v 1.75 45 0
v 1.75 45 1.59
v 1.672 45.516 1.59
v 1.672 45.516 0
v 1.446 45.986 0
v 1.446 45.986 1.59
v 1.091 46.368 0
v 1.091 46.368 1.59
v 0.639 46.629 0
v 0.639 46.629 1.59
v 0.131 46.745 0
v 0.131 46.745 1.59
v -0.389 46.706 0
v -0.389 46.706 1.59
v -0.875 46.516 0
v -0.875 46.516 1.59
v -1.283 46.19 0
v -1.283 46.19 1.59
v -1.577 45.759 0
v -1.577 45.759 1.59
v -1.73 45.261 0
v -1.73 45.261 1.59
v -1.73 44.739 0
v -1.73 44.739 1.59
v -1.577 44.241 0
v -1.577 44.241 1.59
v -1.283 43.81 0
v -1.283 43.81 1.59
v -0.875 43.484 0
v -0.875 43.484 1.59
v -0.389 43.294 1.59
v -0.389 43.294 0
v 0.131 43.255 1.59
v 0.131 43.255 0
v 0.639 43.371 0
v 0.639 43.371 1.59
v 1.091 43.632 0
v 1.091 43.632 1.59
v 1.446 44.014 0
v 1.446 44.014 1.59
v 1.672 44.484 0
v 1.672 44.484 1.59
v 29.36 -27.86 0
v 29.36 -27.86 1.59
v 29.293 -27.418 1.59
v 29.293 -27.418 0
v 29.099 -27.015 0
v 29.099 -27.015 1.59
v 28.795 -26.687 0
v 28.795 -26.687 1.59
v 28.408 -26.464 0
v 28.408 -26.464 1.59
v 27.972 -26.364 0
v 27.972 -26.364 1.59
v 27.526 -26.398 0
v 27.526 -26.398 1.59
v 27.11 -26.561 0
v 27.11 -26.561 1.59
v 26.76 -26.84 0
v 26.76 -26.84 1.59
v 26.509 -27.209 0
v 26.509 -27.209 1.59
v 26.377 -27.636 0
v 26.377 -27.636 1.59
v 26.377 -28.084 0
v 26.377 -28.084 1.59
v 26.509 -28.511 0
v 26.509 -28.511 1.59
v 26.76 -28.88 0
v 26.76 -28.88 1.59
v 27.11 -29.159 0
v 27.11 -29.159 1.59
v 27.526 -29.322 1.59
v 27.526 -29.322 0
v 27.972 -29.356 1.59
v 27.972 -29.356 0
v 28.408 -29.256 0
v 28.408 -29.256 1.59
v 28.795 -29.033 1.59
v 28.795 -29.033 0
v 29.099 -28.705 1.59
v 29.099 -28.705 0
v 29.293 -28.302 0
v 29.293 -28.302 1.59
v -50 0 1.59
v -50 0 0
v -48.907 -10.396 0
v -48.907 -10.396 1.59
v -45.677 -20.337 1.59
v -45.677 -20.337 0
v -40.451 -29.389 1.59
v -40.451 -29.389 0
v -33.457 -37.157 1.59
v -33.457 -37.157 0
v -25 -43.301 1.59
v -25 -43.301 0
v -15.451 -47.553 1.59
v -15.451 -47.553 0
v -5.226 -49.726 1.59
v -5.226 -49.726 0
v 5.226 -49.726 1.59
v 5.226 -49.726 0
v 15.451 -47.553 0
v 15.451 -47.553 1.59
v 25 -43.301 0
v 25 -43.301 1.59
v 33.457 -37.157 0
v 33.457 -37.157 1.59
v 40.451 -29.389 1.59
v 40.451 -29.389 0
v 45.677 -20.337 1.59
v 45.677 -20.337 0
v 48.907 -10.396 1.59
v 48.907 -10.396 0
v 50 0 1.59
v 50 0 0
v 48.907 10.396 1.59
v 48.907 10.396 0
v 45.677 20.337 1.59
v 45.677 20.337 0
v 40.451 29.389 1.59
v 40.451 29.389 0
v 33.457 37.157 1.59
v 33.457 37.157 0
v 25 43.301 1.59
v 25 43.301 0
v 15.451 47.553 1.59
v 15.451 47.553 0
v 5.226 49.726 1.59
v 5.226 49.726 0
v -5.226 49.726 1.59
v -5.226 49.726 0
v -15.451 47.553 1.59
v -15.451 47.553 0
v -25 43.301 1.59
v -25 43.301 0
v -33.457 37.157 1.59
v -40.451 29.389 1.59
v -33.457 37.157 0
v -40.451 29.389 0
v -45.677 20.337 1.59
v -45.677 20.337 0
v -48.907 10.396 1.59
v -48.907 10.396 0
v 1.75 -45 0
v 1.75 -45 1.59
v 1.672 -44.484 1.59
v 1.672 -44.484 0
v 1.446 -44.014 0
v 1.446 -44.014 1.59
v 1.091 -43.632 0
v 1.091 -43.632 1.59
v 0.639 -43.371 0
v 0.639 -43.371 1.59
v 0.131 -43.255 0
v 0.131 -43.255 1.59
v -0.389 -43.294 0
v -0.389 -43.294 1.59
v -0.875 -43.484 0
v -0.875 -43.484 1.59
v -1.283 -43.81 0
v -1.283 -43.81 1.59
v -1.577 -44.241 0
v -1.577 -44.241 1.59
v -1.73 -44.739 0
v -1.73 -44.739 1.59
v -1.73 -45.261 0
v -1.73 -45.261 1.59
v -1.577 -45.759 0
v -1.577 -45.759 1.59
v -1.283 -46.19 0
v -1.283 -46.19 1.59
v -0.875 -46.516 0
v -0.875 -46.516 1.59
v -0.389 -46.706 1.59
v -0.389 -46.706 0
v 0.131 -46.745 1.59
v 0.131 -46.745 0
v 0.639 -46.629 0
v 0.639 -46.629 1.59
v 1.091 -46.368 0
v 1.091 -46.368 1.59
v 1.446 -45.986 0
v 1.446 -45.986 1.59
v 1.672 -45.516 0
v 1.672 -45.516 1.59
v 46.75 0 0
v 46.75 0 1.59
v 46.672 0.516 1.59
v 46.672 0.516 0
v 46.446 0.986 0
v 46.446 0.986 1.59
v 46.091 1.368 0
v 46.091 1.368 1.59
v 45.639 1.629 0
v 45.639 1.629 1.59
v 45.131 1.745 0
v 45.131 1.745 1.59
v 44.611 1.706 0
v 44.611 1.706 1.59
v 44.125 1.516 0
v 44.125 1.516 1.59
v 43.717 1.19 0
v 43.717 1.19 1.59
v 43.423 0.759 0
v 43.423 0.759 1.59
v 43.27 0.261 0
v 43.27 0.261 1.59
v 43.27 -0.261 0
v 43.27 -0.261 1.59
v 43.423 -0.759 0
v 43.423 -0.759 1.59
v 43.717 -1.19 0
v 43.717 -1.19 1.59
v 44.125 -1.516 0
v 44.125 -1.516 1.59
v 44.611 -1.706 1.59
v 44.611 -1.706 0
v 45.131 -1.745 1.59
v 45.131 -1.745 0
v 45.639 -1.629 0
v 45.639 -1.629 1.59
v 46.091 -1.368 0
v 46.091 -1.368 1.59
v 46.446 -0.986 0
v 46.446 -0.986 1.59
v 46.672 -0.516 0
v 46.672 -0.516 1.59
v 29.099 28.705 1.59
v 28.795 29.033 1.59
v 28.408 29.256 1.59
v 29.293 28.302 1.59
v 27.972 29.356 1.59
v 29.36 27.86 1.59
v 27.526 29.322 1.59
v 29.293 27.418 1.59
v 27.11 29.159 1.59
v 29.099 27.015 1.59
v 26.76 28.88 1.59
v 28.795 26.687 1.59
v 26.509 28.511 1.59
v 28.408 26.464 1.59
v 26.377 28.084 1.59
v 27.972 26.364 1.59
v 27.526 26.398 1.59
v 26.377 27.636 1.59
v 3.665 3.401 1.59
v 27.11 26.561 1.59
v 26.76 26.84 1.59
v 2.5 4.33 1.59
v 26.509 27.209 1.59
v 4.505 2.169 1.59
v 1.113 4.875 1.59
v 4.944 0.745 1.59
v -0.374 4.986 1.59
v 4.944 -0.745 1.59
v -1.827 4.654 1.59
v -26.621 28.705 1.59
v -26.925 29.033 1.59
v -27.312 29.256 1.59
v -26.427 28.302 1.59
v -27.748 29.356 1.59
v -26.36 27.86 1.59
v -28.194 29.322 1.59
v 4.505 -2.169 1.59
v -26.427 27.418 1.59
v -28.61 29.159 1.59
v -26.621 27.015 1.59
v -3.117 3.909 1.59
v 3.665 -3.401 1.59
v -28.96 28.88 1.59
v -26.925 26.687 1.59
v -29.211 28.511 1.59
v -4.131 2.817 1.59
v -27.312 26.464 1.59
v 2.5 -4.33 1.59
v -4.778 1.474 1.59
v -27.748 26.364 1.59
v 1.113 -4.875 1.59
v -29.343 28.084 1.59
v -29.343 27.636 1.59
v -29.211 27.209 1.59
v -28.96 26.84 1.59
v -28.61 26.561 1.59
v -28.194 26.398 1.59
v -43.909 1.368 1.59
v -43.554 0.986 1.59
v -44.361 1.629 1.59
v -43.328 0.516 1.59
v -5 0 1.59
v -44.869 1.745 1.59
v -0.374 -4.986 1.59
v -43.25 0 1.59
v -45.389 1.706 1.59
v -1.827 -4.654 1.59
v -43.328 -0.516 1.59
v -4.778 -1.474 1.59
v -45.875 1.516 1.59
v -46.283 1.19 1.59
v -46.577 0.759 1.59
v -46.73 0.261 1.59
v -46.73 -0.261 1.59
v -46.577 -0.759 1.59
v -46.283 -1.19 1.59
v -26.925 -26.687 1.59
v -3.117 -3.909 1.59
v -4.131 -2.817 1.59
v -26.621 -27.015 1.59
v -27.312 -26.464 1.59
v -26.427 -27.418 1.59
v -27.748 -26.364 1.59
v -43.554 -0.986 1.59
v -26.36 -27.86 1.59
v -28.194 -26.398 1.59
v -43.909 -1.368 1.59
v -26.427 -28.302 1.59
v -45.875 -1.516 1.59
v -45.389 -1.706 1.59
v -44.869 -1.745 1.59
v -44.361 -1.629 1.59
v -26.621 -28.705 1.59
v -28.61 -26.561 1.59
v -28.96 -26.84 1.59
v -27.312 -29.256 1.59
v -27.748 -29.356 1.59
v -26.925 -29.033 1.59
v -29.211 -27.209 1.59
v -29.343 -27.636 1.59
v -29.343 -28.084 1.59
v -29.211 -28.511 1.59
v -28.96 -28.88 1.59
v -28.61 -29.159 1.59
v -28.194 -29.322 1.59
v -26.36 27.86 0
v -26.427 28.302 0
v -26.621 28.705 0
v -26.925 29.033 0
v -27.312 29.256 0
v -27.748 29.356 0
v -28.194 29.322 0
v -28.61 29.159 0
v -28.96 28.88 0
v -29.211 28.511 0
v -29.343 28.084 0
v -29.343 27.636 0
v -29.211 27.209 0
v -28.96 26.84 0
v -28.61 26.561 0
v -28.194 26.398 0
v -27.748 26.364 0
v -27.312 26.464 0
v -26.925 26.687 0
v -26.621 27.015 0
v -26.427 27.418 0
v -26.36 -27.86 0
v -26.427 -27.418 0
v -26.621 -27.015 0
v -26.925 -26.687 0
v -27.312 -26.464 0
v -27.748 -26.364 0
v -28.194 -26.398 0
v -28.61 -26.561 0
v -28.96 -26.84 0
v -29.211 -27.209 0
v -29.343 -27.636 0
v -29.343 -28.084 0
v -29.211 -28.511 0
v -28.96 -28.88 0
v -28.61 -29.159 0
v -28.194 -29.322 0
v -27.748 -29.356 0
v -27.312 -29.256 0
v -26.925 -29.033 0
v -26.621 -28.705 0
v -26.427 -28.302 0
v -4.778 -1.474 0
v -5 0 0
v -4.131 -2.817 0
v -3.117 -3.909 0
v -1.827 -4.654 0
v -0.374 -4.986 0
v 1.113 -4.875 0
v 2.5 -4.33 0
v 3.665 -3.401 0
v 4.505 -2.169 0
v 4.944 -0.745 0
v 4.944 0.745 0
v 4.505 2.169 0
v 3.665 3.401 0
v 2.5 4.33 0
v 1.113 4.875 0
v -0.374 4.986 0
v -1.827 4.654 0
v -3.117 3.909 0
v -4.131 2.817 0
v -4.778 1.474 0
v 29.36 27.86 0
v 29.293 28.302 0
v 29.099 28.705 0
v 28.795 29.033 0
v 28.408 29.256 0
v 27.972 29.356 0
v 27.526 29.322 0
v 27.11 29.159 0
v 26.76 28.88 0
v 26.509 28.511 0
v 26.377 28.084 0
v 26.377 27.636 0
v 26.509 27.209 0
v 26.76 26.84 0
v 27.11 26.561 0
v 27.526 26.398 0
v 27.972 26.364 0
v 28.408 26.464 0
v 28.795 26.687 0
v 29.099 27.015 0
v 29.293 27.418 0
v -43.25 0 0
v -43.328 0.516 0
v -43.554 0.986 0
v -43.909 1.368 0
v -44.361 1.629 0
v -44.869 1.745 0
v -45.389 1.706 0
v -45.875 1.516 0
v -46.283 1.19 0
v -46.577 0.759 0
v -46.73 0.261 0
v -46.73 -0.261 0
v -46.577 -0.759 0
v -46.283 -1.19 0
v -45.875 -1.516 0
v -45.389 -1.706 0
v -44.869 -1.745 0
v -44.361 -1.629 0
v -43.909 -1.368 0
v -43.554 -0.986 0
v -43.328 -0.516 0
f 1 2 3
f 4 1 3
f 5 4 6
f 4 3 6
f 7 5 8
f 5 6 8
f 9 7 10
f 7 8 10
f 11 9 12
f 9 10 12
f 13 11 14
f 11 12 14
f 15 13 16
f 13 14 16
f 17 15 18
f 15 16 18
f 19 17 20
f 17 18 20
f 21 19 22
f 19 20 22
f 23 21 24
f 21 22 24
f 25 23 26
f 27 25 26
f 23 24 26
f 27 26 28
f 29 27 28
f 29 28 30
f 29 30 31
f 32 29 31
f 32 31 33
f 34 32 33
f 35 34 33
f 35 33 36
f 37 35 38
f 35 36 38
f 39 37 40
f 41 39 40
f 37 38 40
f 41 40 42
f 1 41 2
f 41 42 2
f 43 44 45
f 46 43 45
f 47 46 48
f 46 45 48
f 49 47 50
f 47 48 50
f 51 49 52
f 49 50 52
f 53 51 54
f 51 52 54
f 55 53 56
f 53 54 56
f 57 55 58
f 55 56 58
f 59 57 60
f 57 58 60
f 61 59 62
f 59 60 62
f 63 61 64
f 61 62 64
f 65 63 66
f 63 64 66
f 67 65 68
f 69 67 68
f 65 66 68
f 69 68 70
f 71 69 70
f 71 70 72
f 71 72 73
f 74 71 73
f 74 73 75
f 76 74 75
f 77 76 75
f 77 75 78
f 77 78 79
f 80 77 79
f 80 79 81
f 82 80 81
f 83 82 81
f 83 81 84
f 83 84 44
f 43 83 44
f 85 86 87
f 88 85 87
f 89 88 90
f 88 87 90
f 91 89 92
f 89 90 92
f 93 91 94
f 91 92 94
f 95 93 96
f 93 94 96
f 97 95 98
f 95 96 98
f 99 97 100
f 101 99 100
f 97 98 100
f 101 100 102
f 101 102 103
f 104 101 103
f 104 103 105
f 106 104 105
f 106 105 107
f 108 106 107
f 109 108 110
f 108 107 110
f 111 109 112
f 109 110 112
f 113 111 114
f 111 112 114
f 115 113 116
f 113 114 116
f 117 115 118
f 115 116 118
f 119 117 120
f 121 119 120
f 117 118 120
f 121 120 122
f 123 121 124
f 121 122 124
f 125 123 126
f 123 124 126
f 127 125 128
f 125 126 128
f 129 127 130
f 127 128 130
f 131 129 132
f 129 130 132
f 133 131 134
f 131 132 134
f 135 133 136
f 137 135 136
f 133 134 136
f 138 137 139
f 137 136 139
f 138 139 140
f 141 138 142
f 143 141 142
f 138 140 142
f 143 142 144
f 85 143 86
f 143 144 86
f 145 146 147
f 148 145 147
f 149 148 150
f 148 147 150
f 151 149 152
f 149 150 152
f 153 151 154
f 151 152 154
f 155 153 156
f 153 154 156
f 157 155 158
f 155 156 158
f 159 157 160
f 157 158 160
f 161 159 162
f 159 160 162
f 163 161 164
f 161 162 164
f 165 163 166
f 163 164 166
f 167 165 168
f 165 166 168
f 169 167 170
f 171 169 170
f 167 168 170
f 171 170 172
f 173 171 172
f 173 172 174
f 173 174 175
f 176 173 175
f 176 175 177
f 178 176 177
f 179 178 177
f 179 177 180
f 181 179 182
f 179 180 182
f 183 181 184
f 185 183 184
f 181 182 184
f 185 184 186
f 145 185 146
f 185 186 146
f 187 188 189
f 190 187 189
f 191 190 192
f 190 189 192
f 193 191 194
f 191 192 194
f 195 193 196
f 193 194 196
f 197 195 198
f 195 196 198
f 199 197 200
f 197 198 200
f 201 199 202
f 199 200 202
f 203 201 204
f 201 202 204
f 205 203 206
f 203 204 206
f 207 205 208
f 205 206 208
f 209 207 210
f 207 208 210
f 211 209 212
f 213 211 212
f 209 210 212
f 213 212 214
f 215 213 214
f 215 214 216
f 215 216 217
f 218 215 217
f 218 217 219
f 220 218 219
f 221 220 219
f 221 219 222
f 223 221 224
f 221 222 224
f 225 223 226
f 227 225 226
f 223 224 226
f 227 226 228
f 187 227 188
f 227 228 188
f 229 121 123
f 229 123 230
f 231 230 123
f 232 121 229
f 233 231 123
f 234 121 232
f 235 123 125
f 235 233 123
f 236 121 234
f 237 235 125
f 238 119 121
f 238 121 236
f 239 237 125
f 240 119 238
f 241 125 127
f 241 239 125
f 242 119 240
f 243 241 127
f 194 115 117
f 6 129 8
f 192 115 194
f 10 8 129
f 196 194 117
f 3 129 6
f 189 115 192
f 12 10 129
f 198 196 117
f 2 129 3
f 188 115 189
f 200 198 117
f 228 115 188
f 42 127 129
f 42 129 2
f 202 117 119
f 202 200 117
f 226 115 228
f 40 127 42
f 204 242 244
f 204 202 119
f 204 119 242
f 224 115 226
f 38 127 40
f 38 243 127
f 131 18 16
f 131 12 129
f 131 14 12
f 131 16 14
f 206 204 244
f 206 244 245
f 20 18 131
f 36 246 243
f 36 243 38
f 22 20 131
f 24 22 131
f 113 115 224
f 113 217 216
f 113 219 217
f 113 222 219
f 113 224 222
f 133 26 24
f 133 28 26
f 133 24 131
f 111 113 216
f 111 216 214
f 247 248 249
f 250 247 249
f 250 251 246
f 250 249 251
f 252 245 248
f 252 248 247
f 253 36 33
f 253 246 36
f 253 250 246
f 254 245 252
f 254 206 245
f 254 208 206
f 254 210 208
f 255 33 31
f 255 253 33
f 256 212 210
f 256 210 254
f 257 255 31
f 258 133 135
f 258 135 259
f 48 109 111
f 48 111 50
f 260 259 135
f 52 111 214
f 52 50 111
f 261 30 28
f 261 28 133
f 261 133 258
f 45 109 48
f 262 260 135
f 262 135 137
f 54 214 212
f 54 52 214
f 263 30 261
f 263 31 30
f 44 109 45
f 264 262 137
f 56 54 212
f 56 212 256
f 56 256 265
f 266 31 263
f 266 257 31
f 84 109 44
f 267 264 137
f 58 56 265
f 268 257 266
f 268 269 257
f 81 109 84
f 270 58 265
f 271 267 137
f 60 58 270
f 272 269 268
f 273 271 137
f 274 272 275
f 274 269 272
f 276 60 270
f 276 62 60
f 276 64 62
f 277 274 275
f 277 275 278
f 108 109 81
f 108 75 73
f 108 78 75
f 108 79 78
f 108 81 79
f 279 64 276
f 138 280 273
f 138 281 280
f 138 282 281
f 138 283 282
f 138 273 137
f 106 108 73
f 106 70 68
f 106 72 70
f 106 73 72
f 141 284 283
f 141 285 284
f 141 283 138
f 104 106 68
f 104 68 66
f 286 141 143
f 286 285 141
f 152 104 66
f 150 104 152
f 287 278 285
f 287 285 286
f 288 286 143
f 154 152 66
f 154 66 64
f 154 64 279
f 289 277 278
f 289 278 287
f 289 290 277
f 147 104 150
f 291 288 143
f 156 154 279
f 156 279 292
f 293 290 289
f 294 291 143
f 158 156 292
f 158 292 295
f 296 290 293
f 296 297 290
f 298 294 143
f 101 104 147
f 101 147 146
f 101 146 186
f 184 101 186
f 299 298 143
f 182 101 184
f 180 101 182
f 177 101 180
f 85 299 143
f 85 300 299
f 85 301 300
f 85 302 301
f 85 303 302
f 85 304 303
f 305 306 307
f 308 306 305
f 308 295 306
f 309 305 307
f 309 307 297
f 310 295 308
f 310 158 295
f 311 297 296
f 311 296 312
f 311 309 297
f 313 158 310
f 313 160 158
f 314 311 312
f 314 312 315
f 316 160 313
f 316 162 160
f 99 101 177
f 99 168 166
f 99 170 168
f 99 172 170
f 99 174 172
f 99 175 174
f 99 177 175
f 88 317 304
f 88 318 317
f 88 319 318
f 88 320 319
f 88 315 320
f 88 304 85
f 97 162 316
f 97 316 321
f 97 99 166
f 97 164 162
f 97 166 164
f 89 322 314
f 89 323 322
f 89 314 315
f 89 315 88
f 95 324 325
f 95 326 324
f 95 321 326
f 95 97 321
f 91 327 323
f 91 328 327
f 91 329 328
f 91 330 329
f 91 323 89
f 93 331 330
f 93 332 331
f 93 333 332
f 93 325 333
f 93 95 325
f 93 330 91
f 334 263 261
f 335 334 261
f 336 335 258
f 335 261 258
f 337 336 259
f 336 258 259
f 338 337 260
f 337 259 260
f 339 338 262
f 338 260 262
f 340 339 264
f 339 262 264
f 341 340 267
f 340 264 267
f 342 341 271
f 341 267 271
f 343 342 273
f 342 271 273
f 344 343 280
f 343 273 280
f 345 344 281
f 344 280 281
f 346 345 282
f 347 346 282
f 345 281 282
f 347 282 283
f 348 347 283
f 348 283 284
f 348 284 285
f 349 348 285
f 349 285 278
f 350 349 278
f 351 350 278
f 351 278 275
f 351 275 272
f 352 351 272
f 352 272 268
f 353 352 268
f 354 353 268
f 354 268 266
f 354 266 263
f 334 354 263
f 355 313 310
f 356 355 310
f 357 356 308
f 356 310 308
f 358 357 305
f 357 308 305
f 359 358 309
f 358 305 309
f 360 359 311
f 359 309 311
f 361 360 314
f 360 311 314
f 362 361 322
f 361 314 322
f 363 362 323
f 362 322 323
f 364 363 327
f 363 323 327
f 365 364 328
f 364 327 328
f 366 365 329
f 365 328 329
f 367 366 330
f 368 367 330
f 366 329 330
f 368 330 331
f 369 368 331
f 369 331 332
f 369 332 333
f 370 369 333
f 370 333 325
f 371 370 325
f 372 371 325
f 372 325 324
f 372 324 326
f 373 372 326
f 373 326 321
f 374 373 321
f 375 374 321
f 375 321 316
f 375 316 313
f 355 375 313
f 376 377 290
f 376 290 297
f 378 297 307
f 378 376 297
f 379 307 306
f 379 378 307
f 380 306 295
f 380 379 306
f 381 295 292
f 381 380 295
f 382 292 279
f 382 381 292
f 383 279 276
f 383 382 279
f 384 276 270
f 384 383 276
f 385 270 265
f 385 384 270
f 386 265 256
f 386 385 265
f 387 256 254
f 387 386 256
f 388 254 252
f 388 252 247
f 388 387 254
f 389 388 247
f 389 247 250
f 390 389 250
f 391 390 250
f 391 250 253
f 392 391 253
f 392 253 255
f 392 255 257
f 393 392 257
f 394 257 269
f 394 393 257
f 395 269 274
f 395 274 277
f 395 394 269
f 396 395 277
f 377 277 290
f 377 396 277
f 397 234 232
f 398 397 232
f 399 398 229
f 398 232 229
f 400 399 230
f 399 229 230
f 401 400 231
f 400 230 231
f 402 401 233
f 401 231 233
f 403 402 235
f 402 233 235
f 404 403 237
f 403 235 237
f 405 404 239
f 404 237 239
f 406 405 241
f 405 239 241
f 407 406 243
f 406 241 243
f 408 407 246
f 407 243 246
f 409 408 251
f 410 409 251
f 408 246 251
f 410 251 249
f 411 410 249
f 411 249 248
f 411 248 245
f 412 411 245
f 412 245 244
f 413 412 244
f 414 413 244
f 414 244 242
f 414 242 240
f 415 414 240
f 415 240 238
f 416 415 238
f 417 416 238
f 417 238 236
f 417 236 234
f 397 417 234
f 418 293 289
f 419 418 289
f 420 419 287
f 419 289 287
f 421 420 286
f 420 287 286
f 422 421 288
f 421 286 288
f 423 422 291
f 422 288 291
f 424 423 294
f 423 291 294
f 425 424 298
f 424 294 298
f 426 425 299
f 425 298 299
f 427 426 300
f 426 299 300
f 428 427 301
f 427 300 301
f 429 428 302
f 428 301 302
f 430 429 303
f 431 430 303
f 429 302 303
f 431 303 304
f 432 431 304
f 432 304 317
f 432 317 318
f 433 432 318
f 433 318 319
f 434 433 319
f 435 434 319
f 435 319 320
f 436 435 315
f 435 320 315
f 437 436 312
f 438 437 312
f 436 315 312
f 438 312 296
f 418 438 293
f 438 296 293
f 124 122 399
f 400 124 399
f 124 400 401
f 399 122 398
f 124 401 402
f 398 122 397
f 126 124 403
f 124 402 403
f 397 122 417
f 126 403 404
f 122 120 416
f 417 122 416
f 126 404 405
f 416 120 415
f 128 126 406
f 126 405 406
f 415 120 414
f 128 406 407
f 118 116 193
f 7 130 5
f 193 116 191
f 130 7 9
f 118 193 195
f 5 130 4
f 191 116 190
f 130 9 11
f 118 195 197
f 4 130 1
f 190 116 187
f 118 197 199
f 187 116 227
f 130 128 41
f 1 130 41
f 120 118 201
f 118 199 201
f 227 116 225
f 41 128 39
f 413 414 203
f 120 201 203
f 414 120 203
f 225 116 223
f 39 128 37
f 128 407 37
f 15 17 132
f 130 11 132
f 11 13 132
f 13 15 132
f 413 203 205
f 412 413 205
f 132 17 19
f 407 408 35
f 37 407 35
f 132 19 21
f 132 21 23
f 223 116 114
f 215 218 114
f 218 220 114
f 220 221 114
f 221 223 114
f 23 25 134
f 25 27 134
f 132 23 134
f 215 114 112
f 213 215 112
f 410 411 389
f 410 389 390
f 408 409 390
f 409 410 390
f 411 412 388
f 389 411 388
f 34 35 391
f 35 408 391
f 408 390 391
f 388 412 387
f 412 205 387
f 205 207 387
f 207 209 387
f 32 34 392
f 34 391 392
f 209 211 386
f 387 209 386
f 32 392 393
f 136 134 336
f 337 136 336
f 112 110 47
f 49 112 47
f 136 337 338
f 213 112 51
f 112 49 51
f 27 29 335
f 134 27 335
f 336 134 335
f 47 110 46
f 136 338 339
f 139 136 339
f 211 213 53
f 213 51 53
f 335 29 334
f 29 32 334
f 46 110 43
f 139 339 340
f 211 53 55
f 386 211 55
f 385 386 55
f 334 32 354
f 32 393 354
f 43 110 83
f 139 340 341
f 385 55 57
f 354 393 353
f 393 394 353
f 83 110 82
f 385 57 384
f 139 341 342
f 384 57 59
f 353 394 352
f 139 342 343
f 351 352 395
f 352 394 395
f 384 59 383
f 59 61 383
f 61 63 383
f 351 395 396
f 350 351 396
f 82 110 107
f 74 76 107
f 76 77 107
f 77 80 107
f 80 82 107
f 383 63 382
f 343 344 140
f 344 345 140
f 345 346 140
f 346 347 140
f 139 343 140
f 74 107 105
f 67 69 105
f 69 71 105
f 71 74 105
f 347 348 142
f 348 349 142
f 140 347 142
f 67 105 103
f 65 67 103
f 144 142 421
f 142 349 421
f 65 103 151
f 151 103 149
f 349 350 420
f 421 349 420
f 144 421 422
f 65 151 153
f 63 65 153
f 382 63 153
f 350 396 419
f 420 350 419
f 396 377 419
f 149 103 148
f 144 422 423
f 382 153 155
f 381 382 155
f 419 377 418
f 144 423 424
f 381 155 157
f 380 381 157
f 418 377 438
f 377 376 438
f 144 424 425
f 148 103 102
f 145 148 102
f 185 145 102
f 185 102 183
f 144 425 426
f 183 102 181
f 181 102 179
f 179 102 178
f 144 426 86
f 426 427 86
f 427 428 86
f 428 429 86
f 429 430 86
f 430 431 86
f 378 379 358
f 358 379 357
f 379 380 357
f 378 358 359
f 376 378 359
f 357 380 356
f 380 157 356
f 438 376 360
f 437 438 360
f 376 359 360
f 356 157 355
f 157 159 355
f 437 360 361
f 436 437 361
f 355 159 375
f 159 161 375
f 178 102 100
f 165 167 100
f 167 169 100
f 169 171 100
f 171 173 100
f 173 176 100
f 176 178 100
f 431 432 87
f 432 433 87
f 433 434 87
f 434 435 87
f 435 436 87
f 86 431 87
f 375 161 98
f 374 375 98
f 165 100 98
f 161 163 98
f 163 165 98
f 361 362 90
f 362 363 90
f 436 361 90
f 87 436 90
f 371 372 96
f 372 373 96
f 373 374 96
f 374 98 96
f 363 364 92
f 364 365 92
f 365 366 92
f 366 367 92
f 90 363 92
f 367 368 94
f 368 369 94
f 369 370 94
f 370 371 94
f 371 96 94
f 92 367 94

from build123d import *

# Parameters (mm, degrees)
SKETCH1_R           = 50
SKETCH1_R_2         = 5
BOSS_EXTRUDE1_DEPTH = 1.59
SKETCH2_R           = 1.75
CUT_EXTRUDE1_DEPTH  = 1.59
SKETCH3_R           = 1.5
CUT_EXTRUDE2_DEPTH  = 10


with BuildPart() as part:
    # Sketch1 → Boss-Extrude1 (new body)
    with BuildSketch(Plane.XY):
        with Locations(Location((0, 0, 0), (0, 0, 180))):
            Circle(SKETCH1_R)
        with Locations(Location((0, 0, 0), (0, 0, 180))):
            Circle(SKETCH1_R_2, mode=Mode.SUBTRACT)
    extrude(amount=BOSS_EXTRUDE1_DEPTH)

    # Sketch2 → Cut-Extrude1 (cut)
    with BuildSketch(Plane.XY.offset(1.59)):
        with Locations((0, 45)):
            Circle(SKETCH2_R)
        with Locations((45, 0)):
            Circle(SKETCH2_R)
        with Locations((0, -45)):
            Circle(SKETCH2_R)
        with Locations((-45, 0)):
            Circle(SKETCH2_R)
    extrude(amount=-CUT_EXTRUDE1_DEPTH, mode=Mode.SUBTRACT)

    # Sketch3 → Cut-Extrude2 (cut)
    with BuildSketch(Plane.XY.offset(1.59)):
        with Locations((-27.86, 27.860014357)):
            Circle(SKETCH3_R)
        with Locations((27.860014357, 27.86)):
            Circle(SKETCH3_R)
        with Locations((27.86, -27.860014357)):
            Circle(SKETCH3_R)
        with Locations((-27.860014357, -27.86)):
            Circle(SKETCH3_R)
    extrude(amount=-CUT_EXTRUDE2_DEPTH, mode=Mode.SUBTRACT)


solid = part.part
